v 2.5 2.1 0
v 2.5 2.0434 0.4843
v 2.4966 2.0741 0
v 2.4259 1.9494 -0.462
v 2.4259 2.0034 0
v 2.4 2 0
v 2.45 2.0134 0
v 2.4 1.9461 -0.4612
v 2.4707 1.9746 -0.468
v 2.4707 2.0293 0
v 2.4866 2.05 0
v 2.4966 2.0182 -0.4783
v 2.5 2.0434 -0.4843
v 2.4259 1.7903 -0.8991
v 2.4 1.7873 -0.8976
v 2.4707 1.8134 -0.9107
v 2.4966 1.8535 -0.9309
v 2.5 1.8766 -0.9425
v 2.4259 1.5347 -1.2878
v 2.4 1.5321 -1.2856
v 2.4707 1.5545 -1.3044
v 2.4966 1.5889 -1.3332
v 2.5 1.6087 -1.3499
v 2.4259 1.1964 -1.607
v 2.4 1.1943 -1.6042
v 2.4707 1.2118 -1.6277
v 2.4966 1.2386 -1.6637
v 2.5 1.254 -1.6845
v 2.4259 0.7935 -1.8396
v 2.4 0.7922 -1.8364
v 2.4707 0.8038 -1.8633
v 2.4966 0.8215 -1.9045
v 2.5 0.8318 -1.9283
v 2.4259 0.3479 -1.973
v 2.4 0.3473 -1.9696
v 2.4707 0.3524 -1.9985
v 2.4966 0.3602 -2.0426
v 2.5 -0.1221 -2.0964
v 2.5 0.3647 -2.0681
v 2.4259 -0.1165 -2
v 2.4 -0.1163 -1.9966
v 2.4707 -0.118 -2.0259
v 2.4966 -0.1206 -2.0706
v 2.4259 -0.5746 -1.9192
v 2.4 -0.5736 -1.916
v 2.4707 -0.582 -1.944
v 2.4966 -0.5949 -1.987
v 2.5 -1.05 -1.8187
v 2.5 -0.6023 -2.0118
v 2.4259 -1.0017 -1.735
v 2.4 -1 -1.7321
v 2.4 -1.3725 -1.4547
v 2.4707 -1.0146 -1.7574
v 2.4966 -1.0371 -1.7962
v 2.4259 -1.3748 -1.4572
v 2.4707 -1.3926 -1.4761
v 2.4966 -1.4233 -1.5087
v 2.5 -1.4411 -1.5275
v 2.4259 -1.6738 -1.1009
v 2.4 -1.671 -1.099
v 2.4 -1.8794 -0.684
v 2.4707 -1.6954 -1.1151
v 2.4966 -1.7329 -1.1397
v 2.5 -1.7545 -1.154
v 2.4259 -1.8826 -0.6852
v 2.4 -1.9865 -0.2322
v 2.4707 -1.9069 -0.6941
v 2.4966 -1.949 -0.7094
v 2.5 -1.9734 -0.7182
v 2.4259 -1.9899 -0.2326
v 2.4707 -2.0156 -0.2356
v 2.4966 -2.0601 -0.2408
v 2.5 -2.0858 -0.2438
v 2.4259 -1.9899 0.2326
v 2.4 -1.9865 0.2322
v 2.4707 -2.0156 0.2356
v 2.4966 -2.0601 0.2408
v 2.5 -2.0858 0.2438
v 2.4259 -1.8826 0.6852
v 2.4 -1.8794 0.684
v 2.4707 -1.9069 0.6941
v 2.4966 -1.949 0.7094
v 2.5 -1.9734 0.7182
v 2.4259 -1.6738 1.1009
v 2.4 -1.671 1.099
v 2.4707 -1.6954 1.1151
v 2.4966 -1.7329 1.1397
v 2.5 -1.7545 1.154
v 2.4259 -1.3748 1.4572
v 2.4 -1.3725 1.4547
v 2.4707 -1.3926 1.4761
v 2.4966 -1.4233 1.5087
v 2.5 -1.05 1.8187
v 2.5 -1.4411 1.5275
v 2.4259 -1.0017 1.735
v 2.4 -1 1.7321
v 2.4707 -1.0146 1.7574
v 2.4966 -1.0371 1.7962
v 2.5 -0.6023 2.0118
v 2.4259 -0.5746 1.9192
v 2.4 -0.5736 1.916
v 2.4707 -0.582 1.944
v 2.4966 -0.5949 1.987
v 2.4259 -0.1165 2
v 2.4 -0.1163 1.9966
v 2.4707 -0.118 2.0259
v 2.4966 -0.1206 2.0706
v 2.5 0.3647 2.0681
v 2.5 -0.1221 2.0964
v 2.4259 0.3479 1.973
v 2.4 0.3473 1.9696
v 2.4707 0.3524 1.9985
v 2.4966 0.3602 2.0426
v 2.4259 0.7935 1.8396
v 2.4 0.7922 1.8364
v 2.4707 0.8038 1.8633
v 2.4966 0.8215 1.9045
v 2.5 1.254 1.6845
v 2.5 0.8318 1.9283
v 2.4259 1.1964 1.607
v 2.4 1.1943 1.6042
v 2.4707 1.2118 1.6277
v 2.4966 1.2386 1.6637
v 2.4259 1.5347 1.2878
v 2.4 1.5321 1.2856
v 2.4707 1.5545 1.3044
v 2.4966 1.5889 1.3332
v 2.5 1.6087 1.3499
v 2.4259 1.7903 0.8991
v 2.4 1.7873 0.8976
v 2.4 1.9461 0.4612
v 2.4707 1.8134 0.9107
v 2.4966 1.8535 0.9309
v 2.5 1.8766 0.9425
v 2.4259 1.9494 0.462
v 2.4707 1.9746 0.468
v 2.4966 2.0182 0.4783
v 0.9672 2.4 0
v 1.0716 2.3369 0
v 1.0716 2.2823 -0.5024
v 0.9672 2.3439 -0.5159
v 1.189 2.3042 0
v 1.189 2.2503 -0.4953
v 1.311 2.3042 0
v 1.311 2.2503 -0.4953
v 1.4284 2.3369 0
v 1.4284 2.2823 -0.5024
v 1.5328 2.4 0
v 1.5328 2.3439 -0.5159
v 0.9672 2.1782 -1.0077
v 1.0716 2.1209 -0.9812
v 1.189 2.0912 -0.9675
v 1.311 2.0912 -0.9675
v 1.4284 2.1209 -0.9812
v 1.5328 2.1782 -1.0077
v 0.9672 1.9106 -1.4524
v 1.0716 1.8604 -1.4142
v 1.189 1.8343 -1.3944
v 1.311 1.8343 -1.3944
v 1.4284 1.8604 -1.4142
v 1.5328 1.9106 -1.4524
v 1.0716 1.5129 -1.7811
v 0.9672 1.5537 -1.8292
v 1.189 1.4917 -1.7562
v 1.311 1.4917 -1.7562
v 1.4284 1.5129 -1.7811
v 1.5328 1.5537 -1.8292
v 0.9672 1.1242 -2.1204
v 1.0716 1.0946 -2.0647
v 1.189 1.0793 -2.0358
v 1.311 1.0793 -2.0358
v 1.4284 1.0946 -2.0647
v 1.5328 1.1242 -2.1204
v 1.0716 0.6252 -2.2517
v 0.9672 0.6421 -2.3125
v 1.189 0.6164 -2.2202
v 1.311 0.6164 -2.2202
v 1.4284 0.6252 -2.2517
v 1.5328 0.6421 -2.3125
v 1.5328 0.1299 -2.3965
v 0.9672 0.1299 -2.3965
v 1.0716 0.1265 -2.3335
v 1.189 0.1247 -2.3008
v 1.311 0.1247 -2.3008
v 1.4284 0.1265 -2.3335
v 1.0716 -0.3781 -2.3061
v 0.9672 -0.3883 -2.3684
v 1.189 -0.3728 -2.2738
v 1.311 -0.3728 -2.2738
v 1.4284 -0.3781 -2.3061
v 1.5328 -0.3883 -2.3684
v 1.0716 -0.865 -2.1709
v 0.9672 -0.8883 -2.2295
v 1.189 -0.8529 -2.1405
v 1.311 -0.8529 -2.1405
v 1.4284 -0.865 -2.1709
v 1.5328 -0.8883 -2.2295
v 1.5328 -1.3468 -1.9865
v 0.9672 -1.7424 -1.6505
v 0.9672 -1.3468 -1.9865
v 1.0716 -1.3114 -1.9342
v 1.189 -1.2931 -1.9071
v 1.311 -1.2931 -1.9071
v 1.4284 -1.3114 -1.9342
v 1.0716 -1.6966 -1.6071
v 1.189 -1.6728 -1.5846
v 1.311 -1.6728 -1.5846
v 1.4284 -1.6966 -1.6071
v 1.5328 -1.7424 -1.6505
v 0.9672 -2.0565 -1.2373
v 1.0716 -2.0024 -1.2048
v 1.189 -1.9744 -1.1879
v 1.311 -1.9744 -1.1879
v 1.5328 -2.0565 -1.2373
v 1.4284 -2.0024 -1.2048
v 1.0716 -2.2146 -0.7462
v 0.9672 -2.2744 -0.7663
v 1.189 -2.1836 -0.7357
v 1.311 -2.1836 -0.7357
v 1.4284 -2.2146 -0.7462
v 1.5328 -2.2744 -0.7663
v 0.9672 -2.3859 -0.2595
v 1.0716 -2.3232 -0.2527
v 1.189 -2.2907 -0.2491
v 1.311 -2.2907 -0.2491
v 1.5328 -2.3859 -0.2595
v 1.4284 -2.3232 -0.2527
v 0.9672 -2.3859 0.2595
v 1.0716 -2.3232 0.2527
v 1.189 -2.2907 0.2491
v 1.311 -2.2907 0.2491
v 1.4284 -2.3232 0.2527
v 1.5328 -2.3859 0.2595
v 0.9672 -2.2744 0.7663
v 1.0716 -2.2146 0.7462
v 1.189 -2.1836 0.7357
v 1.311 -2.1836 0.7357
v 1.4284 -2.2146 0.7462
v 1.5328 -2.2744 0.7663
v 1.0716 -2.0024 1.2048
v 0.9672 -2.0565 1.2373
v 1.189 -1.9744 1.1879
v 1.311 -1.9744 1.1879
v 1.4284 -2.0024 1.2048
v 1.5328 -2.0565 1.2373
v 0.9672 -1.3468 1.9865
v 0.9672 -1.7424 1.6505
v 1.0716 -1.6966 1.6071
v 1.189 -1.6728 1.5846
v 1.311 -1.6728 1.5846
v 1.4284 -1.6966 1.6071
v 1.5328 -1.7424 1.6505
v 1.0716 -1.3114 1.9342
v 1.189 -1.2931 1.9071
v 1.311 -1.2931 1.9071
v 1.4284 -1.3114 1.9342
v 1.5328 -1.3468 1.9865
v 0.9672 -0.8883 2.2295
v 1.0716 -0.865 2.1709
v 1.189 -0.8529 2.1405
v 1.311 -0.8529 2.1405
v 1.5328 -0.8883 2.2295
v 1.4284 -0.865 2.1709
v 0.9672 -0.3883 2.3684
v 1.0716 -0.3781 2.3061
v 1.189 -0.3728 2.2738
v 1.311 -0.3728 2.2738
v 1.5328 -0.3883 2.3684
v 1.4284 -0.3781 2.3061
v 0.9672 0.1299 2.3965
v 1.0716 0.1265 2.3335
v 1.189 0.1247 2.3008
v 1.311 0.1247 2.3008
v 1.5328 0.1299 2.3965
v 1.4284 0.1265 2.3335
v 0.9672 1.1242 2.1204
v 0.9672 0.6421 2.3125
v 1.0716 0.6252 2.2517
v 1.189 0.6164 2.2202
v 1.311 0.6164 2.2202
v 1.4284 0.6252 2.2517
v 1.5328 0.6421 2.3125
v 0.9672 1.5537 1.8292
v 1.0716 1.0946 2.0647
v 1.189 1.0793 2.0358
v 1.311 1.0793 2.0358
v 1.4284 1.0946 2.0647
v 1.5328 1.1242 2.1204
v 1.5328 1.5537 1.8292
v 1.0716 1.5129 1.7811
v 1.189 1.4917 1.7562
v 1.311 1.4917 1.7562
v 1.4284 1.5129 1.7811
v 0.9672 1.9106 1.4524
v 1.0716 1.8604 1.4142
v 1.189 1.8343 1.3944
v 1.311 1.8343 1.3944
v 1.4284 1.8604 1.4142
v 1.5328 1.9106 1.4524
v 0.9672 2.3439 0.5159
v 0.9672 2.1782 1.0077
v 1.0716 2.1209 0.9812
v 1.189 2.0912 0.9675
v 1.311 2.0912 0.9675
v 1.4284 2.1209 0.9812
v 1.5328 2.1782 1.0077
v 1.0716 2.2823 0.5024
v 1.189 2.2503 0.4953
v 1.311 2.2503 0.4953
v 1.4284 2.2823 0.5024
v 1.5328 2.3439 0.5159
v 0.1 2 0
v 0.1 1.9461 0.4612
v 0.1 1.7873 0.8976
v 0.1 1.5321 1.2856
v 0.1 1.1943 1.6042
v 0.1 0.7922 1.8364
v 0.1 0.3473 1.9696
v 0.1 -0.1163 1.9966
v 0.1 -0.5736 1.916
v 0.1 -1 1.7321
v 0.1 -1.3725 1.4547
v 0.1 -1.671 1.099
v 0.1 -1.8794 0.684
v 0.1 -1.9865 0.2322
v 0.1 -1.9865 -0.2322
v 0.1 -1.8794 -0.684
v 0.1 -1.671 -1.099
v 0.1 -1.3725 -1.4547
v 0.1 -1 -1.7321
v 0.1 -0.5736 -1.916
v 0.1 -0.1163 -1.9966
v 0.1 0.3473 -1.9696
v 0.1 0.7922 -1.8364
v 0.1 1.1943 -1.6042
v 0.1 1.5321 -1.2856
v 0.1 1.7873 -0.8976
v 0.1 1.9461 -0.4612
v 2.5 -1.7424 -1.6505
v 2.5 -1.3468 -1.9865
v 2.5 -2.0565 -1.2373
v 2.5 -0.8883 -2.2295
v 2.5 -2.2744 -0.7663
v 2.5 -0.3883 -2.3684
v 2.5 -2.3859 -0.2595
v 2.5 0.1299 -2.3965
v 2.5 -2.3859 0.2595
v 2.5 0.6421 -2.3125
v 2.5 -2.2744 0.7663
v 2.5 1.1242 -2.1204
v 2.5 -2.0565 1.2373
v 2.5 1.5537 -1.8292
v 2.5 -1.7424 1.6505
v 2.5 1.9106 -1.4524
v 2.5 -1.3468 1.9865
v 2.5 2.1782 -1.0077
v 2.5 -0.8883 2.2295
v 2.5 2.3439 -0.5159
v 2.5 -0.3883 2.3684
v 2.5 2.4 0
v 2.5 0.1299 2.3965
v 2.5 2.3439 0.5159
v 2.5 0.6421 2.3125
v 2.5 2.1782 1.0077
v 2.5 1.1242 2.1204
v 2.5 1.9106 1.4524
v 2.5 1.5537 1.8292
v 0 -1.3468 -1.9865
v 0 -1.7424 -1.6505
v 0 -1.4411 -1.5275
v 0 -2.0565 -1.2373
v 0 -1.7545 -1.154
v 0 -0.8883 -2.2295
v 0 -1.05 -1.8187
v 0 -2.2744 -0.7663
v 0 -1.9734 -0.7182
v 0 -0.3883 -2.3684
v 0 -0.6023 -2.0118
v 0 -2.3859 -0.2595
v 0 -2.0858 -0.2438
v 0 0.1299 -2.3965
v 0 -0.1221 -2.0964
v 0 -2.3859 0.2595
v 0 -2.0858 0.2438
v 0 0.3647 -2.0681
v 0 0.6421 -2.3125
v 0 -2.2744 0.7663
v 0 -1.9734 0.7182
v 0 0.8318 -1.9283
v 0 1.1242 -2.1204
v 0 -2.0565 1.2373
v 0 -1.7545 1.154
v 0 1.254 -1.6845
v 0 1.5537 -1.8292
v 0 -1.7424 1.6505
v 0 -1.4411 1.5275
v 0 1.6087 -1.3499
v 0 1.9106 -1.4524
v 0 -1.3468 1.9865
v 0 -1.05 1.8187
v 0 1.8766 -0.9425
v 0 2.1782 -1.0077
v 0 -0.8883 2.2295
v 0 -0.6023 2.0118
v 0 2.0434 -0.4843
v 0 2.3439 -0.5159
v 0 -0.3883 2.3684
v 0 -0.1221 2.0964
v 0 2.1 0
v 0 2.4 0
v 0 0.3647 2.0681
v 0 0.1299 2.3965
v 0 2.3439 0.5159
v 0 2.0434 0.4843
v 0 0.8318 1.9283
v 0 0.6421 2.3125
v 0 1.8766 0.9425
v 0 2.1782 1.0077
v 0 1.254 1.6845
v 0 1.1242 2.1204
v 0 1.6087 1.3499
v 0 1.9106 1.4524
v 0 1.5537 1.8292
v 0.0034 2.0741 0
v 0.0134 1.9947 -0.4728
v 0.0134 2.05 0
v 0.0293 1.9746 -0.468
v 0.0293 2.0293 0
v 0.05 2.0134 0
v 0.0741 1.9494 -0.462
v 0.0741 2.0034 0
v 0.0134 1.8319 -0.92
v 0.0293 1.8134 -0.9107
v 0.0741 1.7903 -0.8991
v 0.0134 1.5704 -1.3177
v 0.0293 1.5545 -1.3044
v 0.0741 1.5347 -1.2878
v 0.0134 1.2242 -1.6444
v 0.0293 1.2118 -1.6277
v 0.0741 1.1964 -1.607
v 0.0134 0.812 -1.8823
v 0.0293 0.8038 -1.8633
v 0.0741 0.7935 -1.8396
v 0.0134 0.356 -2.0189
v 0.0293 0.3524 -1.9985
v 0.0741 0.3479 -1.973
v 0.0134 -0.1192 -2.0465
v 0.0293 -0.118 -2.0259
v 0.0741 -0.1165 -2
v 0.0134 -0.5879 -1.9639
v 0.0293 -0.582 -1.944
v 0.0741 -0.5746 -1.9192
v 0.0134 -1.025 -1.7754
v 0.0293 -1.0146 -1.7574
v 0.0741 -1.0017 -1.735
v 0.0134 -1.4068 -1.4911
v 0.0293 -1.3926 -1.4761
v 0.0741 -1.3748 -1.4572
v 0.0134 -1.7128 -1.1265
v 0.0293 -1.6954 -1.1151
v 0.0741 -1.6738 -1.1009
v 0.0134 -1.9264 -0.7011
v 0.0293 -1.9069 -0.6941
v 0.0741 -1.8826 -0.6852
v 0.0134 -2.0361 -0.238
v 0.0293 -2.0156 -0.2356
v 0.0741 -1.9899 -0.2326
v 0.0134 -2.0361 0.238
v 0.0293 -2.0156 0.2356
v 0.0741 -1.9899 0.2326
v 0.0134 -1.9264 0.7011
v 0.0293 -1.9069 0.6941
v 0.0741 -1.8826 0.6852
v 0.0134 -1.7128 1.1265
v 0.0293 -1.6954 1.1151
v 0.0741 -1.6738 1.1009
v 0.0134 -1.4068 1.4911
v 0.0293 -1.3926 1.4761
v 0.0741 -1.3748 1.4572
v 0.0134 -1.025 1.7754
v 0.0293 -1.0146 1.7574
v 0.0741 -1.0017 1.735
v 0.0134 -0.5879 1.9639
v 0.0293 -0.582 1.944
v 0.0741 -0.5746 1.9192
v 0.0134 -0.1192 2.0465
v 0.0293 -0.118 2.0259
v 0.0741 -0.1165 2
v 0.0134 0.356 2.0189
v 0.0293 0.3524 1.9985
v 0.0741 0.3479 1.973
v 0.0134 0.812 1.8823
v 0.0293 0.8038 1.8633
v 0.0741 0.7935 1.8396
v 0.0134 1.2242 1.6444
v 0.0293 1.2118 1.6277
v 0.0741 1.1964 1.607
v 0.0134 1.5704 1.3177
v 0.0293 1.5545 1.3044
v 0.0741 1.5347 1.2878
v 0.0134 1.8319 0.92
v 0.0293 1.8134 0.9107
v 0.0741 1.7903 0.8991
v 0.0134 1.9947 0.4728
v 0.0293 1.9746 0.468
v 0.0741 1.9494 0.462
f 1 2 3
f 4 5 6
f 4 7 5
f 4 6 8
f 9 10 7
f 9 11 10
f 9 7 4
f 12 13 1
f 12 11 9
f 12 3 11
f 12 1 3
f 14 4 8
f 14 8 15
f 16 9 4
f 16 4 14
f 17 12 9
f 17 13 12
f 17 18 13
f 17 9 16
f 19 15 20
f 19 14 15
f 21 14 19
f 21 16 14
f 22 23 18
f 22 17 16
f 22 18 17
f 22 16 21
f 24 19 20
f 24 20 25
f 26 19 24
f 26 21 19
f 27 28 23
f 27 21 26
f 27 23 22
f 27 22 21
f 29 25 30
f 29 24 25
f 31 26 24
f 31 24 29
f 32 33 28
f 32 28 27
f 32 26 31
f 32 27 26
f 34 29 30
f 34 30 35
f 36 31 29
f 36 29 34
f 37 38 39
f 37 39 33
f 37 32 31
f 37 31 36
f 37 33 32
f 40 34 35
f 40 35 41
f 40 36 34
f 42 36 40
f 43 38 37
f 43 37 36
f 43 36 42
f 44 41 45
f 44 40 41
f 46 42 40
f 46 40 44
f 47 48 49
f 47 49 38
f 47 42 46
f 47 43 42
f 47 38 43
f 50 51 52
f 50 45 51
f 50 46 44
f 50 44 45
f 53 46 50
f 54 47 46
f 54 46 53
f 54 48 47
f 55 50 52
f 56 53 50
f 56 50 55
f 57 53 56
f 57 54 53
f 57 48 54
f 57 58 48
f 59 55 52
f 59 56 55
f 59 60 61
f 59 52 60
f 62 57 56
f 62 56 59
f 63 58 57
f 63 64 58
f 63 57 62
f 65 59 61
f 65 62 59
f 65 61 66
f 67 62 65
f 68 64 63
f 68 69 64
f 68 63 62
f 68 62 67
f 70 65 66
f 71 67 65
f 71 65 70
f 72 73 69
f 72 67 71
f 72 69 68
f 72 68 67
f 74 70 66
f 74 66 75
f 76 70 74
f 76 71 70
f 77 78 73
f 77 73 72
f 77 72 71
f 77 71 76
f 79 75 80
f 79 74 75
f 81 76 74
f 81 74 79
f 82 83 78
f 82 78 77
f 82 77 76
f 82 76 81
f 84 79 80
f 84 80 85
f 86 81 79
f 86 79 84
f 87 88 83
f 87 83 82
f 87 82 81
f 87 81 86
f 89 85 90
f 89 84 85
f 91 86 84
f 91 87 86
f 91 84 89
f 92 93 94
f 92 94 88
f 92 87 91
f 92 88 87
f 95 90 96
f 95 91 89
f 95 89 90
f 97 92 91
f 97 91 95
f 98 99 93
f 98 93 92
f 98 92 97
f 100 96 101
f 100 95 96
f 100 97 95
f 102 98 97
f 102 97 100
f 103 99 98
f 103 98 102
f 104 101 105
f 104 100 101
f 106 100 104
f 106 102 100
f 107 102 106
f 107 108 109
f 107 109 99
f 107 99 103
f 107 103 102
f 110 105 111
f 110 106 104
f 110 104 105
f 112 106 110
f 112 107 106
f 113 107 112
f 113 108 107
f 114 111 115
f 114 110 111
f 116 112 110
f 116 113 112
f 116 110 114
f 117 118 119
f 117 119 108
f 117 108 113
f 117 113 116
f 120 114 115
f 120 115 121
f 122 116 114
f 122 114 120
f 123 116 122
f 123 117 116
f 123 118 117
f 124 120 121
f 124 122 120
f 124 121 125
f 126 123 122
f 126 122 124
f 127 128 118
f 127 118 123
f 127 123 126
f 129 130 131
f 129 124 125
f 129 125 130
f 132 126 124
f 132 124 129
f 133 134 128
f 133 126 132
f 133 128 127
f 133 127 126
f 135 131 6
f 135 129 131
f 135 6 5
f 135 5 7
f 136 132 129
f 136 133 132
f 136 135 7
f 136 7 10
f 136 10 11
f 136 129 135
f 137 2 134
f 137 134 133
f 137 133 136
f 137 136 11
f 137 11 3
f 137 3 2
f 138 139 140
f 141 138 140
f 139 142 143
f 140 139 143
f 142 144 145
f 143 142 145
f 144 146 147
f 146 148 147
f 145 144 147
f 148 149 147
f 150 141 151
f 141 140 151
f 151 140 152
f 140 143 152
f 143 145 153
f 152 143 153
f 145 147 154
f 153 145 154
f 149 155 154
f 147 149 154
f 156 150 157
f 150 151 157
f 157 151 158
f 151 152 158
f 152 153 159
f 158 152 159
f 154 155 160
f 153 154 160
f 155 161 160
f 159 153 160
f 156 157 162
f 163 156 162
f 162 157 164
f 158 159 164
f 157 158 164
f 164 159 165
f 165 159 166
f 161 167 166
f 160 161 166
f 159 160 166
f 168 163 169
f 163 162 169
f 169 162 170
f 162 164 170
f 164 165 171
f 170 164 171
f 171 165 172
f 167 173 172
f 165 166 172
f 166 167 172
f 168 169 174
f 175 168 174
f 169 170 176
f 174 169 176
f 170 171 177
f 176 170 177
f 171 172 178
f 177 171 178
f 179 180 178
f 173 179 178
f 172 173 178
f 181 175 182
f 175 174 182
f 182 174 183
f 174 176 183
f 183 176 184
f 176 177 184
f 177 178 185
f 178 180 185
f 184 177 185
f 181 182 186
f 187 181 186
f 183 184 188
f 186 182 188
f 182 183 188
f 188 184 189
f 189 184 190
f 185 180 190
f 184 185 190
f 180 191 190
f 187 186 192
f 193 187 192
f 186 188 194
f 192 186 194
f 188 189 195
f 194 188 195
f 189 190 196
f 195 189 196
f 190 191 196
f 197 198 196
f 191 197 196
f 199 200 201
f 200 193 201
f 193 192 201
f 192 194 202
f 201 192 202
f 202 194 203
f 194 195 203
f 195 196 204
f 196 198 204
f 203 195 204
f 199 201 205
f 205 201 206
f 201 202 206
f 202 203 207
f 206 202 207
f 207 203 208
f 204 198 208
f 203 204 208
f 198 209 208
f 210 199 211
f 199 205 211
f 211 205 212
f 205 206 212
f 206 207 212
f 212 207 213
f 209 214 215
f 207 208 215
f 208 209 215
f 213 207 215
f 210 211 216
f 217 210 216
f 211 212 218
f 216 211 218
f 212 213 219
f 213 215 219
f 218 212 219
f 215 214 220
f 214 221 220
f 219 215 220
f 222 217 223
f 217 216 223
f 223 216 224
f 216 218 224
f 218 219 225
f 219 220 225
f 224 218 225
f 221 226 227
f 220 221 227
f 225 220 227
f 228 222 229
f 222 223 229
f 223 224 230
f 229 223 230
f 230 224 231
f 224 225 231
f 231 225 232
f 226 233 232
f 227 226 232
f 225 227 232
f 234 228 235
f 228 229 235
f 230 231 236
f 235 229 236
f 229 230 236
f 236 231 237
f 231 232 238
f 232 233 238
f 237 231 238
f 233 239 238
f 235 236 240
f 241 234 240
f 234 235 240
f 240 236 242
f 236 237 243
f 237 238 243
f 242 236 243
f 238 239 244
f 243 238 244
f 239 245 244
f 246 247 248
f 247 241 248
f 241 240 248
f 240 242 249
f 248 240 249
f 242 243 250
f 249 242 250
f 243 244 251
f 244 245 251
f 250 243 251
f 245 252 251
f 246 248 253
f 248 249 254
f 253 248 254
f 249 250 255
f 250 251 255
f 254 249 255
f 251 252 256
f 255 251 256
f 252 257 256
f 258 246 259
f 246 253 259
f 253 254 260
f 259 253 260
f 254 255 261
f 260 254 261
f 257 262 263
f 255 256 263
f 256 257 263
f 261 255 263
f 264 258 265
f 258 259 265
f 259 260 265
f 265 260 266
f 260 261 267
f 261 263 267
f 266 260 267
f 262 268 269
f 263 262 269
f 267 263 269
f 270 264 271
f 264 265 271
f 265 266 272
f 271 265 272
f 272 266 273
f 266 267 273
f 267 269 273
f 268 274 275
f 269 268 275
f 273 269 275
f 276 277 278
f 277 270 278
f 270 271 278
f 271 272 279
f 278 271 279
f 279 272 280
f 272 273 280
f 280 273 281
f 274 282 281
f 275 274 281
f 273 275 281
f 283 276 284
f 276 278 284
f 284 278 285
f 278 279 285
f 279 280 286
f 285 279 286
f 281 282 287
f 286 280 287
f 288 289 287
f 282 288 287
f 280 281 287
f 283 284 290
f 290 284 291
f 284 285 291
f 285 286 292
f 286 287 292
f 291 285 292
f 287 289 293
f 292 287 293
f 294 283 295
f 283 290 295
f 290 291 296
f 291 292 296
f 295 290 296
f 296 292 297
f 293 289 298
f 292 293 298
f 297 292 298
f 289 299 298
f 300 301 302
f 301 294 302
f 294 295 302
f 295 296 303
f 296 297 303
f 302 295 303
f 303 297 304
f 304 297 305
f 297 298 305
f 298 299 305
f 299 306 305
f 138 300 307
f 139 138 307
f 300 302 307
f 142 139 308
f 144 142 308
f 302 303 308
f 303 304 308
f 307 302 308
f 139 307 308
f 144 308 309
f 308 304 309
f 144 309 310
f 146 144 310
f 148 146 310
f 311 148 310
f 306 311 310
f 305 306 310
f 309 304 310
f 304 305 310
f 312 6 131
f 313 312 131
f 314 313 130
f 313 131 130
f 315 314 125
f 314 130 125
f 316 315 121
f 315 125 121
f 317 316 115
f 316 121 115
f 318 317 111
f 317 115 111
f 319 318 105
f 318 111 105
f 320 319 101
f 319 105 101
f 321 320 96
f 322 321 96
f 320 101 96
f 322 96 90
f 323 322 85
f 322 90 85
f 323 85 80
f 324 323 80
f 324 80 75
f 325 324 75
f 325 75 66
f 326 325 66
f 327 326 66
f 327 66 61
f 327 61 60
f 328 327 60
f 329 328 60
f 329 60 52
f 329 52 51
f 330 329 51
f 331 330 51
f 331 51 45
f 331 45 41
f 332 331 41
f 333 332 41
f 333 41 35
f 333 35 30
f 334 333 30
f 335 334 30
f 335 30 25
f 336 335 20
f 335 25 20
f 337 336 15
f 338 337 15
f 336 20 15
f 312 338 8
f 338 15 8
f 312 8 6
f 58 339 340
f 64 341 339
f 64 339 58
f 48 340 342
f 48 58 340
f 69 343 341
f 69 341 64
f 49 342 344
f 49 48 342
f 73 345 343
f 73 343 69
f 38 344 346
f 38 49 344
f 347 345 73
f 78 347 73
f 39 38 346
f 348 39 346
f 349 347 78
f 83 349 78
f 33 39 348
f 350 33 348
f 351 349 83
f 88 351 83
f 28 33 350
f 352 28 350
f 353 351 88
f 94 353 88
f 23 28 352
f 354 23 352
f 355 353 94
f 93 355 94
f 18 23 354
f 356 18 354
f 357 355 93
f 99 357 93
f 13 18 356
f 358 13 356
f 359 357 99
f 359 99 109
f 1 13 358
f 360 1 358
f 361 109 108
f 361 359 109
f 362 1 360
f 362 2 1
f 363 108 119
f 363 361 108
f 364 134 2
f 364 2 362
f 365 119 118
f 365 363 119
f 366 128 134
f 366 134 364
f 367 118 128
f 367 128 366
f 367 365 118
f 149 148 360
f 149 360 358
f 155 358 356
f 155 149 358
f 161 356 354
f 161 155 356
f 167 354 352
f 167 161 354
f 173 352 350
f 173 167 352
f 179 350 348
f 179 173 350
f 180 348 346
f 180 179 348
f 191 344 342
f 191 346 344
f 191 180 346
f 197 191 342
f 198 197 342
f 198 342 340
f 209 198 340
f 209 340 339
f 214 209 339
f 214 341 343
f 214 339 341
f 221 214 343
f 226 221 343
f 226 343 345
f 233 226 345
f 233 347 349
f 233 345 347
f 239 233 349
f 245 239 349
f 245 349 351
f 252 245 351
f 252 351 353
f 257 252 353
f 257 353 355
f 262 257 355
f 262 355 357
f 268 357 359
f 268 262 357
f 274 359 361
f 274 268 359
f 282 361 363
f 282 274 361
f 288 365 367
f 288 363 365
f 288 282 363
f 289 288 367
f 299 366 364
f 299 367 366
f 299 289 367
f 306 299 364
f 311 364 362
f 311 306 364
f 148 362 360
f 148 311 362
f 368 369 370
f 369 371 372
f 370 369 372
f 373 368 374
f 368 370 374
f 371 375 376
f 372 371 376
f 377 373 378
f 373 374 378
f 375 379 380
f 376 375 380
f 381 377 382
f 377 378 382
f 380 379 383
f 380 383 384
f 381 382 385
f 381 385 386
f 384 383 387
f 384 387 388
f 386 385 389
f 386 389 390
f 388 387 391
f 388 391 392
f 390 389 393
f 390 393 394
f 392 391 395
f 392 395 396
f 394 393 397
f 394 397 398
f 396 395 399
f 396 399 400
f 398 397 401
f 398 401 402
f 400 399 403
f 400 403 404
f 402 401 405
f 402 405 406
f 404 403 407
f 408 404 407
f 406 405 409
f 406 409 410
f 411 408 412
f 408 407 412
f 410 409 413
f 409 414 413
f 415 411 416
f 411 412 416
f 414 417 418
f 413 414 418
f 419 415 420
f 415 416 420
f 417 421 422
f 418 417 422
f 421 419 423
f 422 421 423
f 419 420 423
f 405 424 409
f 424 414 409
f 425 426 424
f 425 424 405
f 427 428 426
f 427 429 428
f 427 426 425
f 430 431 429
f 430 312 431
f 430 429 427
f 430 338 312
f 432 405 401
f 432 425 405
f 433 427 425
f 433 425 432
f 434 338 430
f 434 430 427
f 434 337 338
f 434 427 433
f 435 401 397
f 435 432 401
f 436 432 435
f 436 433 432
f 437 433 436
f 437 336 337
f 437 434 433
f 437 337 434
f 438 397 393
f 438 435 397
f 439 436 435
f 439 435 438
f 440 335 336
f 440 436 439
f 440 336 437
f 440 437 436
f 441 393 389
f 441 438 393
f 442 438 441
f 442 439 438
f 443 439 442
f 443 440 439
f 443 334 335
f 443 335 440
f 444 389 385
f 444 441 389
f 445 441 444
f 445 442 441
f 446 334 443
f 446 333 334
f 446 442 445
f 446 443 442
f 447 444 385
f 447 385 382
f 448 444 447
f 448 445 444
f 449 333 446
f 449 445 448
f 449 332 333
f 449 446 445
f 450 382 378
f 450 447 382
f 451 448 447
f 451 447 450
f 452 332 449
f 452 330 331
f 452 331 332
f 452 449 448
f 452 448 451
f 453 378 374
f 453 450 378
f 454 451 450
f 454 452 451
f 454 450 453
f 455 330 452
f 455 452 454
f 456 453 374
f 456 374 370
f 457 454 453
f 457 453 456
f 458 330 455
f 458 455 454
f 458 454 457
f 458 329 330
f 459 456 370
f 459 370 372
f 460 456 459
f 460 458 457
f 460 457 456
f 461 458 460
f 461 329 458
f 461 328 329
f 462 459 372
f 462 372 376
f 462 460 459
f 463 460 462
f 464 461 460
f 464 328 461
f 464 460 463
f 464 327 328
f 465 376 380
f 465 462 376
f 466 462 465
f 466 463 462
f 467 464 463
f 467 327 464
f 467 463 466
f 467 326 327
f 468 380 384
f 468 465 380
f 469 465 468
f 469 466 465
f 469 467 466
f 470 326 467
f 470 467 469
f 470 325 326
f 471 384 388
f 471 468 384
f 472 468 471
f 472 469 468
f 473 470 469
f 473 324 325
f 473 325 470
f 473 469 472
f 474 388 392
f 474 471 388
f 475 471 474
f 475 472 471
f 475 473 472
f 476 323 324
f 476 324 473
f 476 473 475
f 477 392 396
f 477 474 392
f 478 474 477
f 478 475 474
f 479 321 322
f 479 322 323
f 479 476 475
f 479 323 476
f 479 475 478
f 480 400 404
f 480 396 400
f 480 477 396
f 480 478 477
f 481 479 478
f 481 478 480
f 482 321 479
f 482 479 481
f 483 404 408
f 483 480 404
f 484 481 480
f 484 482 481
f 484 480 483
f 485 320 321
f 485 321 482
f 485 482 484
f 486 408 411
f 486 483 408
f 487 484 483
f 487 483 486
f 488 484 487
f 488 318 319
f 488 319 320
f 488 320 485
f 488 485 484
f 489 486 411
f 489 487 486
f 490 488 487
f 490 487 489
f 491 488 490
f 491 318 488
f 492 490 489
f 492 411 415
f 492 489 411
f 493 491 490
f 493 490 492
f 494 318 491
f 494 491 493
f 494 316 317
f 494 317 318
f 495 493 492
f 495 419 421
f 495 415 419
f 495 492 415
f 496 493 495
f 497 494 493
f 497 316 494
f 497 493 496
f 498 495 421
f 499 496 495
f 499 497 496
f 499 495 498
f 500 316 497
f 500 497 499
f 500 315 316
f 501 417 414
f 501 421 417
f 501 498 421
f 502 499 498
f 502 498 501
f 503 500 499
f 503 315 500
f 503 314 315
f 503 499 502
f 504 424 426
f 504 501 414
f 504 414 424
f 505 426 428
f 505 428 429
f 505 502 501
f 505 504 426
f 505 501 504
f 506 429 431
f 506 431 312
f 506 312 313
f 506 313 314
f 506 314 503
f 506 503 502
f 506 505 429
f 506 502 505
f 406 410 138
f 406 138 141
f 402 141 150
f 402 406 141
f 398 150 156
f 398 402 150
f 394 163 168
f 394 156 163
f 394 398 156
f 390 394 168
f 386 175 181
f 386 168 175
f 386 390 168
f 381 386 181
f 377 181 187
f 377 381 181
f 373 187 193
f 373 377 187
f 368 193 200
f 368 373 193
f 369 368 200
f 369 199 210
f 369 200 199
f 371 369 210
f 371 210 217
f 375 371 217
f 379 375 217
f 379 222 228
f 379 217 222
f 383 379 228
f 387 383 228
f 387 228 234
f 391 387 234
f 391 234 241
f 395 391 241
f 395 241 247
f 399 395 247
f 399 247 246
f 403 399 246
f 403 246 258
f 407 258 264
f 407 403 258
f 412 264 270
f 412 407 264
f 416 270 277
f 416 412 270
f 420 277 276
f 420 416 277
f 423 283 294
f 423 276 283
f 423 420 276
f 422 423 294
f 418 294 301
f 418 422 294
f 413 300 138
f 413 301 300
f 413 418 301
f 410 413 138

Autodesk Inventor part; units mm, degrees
sketch "Sketch_1" plane through (0, 0, 0) normal (0, 0, 1) x (1, 0, 0)
  line L0 (2.5, 0) -> (0, 0)
  arc A0 (0, 2.1) -> (0.1, 2) centre (0.1, 2.1) ccw
  line L1 (0.1, 2) -> (2.4, 2)
  arc A1 (2.4, 2) -> (2.5, 2.1) centre (2.4, 2.1) ccw
  line L2 (2.5, 2.1) -> (2.5, 2.4)
  line L3 (2.5, 2.4) -> (1.5328, 2.4)
  arc A2 (0.9672, 2.4) -> (1.5328, 2.4) centre (1.25, 2.75) ccw
  line L4 (0.9672, 2.4) -> (0, 2.4)
  line L5 (0, 2.4) -> (0, 2.1)
revolve "Revolution1" add sketch "Sketch_1" angle 360 about axis through (2.5, 0, 0) along (1, 0, 0)
ref_plane "ip_st_1_1_XY" through (1.25, 2.75, 0) normal (1, 0, 0) x (0, 0, -1)
ref_plane "ip_st_1_1_YZ" through (1.25, 2.75, 0) normal (0, 0, -1) x (0, 1, 0)
ref_plane "ip_st_1_1_ZX" through (1.25, 2.75, 0) normal (0, 1, 0) x (1, 0, 0)
ref_plane "ip_st_1_10_XY" through (1.25, -1.7146, -2.15) normal (1, 0, 0) x (0, 0, -1)
ref_plane "ip_st_1_10_YZ" through (1.25, -1.7146, -2.15) normal (0, 0, -1) x (0, 1, 0)
ref_plane "ip_st_1_10_ZX" through (1.25, -1.7146, -2.15) normal (0, 1, 0) x (1, 0, 0)
ref_plane "ip_st_1_11_XY" through (1.25, -0.6119, -2.6811) normal (1, 0, 0) x (0, 0, -1)
ref_plane "ip_st_1_11_YZ" through (1.25, -0.6119, -2.6811) normal (0, 0, -1) x (0, 1, 0)
ref_plane "ip_st_1_11_ZX" through (1.25, -0.6119, -2.6811) normal (0, 1, 0) x (1, 0, 0)
ref_plane "ip_st_1_12_XY" through (1.25, 0.6119, -2.6811) normal (1, 0, 0) x (0, 0, -1)
ref_plane "ip_st_1_12_YZ" through (1.25, 0.6119, -2.6811) normal (0, 0, -1) x (0, 1, 0)
ref_plane "ip_st_1_12_ZX" through (1.25, 0.6119, -2.6811) normal (0, 1, 0) x (1, 0, 0)
ref_plane "ip_st_1_13_XY" through (1.25, 1.7146, -2.15) normal (1, 0, 0) x (0, 0, -1)
ref_plane "ip_st_1_13_YZ" through (1.25, 1.7146, -2.15) normal (0, 0, -1) x (0, 1, 0)
ref_plane "ip_st_1_13_ZX" through (1.25, 1.7146, -2.15) normal (0, 1, 0) x (1, 0, 0)
ref_plane "ip_st_1_14_XY" through (1.25, 2.4777, -1.1932) normal (1, 0, 0) x (0, 0, -1)
ref_plane "ip_st_1_14_YZ" through (1.25, 2.4777, -1.1932) normal (0, 0, -1) x (0, 1, 0)
ref_plane "ip_st_1_14_ZX" through (1.25, 2.4777, -1.1932) normal (0, 1, 0) x (1, 0, 0)
ref_plane "ip_st_1_2_XY" through (1.25, 2.4777, 1.1932) normal (1, 0, 0) x (0, 0, -1)
ref_plane "ip_st_1_2_YZ" through (1.25, 2.4777, 1.1932) normal (0, 0, -1) x (0, 1, 0)
ref_plane "ip_st_1_2_ZX" through (1.25, 2.4777, 1.1932) normal (0, 1, 0) x (1, 0, 0)
ref_plane "ip_st_1_3_XY" through (1.25, 1.7146, 2.15) normal (1, 0, 0) x (0, 0, -1)
ref_plane "ip_st_1_3_YZ" through (1.25, 1.7146, 2.15) normal (0, 0, -1) x (0, 1, 0)
ref_plane "ip_st_1_3_ZX" through (1.25, 1.7146, 2.15) normal (0, 1, 0) x (1, 0, 0)
ref_plane "ip_st_1_4_XY" through (1.25, 0.6119, 2.6811) normal (1, 0, 0) x (0, 0, -1)
ref_plane "ip_st_1_4_YZ" through (1.25, 0.6119, 2.6811) normal (0, 0, -1) x (0, 1, 0)
ref_plane "ip_st_1_4_ZX" through (1.25, 0.6119, 2.6811) normal (0, 1, 0) x (1, 0, 0)
ref_plane "ip_st_1_5_XY" through (1.25, -0.6119, 2.6811) normal (1, 0, 0) x (0, 0, -1)
ref_plane "ip_st_1_5_YZ" through (1.25, -0.6119, 2.6811) normal (0, 0, -1) x (0, 1, 0)
ref_plane "ip_st_1_5_ZX" through (1.25, -0.6119, 2.6811) normal (0, 1, 0) x (1, 0, 0)
ref_plane "ip_st_1_6_XY" through (1.25, -1.7146, 2.15) normal (1, 0, 0) x (0, 0, -1)
ref_plane "ip_st_1_6_YZ" through (1.25, -1.7146, 2.15) normal (0, 0, -1) x (0, 1, 0)
ref_plane "ip_st_1_6_ZX" through (1.25, -1.7146, 2.15) normal (0, 1, 0) x (1, 0, 0)
ref_plane "ip_st_1_7_XY" through (1.25, -2.4777, 1.1932) normal (1, 0, 0) x (0, 0, -1)
ref_plane "ip_st_1_7_YZ" through (1.25, -2.4777, 1.1932) normal (0, 0, -1) x (0, 1, 0)
ref_plane "ip_st_1_7_ZX" through (1.25, -2.4777, 1.1932) normal (0, 1, 0) x (1, 0, 0)
ref_plane "ip_st_1_8_XY" through (1.25, -2.75, 0) normal (1, 0, 0) x (0, 0, -1)
ref_plane "ip_st_1_8_YZ" through (1.25, -2.75, 0) normal (0, 0, -1) x (0, 1, 0)
ref_plane "ip_st_1_8_ZX" through (1.25, -2.75, 0) normal (0, 1, 0) x (1, 0, 0)
ref_plane "ip_st_1_9_XY" through (1.25, -2.4777, -1.1932) normal (1, 0, 0) x (0, 0, -1)
ref_plane "ip_st_1_9_YZ" through (1.25, -2.4777, -1.1932) normal (0, 0, -1) x (0, 1, 0)
ref_plane "ip_st_1_9_ZX" through (1.25, -2.4777, -1.1932) normal (0, 1, 0) x (1, 0, 0)
ref_plane "ip_st_1a_XY" through (0, 0, 0) normal (1, 0, 0) x (0, 0, -1)
ref_plane "ip_st_1a_YZ" through (0, 0, 0) normal (0, 0, -1) x (0, 1, 0)
ref_plane "ip_st_1a_ZX" through (0, 0, 0) normal (0, 1, 0) x (1, 0, 0)
ref_plane "ip_st_2a_XY" through (0.1562, 0, 0) normal (1, 0, 0) x (0, 0, -1)
ref_plane "ip_st_2a_YZ" through (0.1562, 0, 0) normal (0, 0, -1) x (0, 1, 0)
ref_plane "ip_st_2a_ZX" through (0.1562, 0, 0) normal (0, 1, 0) x (1, 0, 0)
properties part number "MF74ZZ Inner Ring"
